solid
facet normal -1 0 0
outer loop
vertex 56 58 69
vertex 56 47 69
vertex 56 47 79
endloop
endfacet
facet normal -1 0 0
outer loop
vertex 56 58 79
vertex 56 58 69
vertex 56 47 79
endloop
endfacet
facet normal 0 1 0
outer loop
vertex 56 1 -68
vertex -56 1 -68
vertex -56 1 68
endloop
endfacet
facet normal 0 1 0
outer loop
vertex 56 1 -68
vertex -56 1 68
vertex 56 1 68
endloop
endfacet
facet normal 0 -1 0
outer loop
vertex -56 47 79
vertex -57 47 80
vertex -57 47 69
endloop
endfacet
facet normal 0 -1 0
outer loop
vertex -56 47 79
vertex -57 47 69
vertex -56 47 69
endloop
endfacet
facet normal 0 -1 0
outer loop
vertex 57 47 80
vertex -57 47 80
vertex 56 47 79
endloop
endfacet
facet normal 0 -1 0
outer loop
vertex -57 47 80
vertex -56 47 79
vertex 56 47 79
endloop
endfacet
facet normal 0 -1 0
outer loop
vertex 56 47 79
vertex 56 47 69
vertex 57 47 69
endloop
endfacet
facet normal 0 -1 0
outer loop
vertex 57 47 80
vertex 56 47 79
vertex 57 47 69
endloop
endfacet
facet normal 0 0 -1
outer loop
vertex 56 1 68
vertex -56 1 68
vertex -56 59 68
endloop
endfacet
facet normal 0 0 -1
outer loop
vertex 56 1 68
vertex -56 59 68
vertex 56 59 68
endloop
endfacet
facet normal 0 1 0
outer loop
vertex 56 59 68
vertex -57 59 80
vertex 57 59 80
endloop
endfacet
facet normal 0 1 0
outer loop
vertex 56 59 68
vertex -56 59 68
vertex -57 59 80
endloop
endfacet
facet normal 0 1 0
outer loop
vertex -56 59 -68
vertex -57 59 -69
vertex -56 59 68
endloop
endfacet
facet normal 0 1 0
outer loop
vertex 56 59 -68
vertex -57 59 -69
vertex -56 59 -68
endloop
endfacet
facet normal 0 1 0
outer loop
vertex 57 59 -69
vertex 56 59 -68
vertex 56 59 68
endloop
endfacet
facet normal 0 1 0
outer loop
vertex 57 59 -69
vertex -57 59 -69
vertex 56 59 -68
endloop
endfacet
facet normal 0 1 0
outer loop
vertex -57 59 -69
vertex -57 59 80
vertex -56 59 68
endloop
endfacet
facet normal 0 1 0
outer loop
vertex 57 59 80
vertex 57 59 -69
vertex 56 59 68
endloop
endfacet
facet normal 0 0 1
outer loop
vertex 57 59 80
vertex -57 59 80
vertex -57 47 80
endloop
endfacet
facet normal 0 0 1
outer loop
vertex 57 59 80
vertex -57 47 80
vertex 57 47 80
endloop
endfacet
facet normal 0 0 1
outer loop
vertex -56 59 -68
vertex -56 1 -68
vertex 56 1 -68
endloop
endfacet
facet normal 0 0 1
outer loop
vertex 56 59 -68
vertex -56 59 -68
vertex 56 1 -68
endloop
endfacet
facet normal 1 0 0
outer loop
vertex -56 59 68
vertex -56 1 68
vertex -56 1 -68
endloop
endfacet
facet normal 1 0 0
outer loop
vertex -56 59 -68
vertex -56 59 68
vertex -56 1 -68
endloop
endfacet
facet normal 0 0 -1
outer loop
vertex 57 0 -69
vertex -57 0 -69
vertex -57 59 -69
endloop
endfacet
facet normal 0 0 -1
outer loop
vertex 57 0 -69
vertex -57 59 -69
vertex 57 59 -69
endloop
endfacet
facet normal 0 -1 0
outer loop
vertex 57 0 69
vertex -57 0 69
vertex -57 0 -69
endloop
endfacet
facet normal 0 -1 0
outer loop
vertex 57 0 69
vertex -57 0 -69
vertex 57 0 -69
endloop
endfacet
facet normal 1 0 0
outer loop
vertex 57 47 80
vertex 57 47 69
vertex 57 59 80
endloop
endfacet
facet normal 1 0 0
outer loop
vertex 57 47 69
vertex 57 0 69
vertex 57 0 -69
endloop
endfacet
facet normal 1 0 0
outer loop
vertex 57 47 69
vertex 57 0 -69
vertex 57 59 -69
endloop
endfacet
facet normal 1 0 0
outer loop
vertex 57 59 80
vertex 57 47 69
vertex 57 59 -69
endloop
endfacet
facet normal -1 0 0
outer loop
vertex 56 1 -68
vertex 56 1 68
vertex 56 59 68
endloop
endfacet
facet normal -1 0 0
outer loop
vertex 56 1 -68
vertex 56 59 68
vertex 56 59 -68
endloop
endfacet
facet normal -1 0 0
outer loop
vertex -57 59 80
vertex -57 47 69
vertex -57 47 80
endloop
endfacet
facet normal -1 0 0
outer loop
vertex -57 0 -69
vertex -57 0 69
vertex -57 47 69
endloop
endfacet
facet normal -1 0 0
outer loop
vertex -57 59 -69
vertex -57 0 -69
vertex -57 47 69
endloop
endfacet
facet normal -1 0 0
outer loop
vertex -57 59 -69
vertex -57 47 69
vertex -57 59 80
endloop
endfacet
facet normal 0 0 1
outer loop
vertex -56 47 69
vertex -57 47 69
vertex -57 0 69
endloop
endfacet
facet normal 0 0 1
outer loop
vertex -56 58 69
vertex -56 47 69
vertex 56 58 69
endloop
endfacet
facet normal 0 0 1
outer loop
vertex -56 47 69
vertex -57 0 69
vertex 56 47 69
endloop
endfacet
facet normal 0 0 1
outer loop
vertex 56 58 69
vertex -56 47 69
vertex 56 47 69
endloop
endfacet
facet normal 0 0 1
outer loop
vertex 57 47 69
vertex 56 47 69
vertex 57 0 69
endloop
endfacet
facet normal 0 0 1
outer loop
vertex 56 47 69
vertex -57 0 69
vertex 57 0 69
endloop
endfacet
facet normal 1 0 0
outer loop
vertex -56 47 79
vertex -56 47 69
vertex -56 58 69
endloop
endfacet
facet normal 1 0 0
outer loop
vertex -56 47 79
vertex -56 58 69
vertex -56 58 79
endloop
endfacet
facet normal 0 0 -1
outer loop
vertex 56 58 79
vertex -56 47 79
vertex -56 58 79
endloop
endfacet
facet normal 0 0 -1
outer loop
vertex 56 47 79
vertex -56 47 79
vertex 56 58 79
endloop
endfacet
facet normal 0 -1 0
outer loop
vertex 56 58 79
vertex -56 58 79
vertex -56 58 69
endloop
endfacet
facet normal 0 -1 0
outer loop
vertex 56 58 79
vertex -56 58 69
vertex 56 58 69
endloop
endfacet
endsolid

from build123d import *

# Parameters (mm, degrees)
SKETCH_4_W          = 114
SKETCH_4_H          = 138
EXTRUDE_1_DEPTH     = 59
SHELL_1_T           = -1
SKETCH_5_W          = 114
SKETCH_5_H          = 12
EXTRUDE_2_DEPTH     = 11
SKETCH_6_W          = 112
SKETCH_6_H          = 10
CUT_EXTRUDE_1_DEPTH = 11


with BuildPart() as part:
    # 草图4 → 凸台-拉伸1 (new body)
    with BuildSketch(Plane(origin=(0, 0, 0), x_dir=(1, 0, 0), z_dir=(0, 1, 0))):
        Rectangle(SKETCH_4_W, SKETCH_4_H)
    extrude(amount=EXTRUDE_1_DEPTH)

    # 抽壳1
    shell_1_openings = [part.faces().sort_by_distance(p)[0] for p in [
        (0, 59, 0),
    ]]
    offset(amount=SHELL_1_T, openings=shell_1_openings, kind=Kind.INTERSECTION)

    # 草图5 → 凸台-拉伸2 (add)
    with BuildSketch(Plane.XY.offset(69)):
        with Locations((0, 53)):
            Rectangle(SKETCH_5_W, SKETCH_5_H)
    extrude(amount=EXTRUDE_2_DEPTH)

    # 草图6 → 切除-拉伸1 (cut)
    with BuildSketch(Plane.XZ.offset(-47)):
        with Locations((0, 74)):
            Rectangle(SKETCH_6_W, SKETCH_6_H)
    extrude(amount=-CUT_EXTRUDE_1_DEPTH, mode=Mode.SUBTRACT)


solid = part.part
